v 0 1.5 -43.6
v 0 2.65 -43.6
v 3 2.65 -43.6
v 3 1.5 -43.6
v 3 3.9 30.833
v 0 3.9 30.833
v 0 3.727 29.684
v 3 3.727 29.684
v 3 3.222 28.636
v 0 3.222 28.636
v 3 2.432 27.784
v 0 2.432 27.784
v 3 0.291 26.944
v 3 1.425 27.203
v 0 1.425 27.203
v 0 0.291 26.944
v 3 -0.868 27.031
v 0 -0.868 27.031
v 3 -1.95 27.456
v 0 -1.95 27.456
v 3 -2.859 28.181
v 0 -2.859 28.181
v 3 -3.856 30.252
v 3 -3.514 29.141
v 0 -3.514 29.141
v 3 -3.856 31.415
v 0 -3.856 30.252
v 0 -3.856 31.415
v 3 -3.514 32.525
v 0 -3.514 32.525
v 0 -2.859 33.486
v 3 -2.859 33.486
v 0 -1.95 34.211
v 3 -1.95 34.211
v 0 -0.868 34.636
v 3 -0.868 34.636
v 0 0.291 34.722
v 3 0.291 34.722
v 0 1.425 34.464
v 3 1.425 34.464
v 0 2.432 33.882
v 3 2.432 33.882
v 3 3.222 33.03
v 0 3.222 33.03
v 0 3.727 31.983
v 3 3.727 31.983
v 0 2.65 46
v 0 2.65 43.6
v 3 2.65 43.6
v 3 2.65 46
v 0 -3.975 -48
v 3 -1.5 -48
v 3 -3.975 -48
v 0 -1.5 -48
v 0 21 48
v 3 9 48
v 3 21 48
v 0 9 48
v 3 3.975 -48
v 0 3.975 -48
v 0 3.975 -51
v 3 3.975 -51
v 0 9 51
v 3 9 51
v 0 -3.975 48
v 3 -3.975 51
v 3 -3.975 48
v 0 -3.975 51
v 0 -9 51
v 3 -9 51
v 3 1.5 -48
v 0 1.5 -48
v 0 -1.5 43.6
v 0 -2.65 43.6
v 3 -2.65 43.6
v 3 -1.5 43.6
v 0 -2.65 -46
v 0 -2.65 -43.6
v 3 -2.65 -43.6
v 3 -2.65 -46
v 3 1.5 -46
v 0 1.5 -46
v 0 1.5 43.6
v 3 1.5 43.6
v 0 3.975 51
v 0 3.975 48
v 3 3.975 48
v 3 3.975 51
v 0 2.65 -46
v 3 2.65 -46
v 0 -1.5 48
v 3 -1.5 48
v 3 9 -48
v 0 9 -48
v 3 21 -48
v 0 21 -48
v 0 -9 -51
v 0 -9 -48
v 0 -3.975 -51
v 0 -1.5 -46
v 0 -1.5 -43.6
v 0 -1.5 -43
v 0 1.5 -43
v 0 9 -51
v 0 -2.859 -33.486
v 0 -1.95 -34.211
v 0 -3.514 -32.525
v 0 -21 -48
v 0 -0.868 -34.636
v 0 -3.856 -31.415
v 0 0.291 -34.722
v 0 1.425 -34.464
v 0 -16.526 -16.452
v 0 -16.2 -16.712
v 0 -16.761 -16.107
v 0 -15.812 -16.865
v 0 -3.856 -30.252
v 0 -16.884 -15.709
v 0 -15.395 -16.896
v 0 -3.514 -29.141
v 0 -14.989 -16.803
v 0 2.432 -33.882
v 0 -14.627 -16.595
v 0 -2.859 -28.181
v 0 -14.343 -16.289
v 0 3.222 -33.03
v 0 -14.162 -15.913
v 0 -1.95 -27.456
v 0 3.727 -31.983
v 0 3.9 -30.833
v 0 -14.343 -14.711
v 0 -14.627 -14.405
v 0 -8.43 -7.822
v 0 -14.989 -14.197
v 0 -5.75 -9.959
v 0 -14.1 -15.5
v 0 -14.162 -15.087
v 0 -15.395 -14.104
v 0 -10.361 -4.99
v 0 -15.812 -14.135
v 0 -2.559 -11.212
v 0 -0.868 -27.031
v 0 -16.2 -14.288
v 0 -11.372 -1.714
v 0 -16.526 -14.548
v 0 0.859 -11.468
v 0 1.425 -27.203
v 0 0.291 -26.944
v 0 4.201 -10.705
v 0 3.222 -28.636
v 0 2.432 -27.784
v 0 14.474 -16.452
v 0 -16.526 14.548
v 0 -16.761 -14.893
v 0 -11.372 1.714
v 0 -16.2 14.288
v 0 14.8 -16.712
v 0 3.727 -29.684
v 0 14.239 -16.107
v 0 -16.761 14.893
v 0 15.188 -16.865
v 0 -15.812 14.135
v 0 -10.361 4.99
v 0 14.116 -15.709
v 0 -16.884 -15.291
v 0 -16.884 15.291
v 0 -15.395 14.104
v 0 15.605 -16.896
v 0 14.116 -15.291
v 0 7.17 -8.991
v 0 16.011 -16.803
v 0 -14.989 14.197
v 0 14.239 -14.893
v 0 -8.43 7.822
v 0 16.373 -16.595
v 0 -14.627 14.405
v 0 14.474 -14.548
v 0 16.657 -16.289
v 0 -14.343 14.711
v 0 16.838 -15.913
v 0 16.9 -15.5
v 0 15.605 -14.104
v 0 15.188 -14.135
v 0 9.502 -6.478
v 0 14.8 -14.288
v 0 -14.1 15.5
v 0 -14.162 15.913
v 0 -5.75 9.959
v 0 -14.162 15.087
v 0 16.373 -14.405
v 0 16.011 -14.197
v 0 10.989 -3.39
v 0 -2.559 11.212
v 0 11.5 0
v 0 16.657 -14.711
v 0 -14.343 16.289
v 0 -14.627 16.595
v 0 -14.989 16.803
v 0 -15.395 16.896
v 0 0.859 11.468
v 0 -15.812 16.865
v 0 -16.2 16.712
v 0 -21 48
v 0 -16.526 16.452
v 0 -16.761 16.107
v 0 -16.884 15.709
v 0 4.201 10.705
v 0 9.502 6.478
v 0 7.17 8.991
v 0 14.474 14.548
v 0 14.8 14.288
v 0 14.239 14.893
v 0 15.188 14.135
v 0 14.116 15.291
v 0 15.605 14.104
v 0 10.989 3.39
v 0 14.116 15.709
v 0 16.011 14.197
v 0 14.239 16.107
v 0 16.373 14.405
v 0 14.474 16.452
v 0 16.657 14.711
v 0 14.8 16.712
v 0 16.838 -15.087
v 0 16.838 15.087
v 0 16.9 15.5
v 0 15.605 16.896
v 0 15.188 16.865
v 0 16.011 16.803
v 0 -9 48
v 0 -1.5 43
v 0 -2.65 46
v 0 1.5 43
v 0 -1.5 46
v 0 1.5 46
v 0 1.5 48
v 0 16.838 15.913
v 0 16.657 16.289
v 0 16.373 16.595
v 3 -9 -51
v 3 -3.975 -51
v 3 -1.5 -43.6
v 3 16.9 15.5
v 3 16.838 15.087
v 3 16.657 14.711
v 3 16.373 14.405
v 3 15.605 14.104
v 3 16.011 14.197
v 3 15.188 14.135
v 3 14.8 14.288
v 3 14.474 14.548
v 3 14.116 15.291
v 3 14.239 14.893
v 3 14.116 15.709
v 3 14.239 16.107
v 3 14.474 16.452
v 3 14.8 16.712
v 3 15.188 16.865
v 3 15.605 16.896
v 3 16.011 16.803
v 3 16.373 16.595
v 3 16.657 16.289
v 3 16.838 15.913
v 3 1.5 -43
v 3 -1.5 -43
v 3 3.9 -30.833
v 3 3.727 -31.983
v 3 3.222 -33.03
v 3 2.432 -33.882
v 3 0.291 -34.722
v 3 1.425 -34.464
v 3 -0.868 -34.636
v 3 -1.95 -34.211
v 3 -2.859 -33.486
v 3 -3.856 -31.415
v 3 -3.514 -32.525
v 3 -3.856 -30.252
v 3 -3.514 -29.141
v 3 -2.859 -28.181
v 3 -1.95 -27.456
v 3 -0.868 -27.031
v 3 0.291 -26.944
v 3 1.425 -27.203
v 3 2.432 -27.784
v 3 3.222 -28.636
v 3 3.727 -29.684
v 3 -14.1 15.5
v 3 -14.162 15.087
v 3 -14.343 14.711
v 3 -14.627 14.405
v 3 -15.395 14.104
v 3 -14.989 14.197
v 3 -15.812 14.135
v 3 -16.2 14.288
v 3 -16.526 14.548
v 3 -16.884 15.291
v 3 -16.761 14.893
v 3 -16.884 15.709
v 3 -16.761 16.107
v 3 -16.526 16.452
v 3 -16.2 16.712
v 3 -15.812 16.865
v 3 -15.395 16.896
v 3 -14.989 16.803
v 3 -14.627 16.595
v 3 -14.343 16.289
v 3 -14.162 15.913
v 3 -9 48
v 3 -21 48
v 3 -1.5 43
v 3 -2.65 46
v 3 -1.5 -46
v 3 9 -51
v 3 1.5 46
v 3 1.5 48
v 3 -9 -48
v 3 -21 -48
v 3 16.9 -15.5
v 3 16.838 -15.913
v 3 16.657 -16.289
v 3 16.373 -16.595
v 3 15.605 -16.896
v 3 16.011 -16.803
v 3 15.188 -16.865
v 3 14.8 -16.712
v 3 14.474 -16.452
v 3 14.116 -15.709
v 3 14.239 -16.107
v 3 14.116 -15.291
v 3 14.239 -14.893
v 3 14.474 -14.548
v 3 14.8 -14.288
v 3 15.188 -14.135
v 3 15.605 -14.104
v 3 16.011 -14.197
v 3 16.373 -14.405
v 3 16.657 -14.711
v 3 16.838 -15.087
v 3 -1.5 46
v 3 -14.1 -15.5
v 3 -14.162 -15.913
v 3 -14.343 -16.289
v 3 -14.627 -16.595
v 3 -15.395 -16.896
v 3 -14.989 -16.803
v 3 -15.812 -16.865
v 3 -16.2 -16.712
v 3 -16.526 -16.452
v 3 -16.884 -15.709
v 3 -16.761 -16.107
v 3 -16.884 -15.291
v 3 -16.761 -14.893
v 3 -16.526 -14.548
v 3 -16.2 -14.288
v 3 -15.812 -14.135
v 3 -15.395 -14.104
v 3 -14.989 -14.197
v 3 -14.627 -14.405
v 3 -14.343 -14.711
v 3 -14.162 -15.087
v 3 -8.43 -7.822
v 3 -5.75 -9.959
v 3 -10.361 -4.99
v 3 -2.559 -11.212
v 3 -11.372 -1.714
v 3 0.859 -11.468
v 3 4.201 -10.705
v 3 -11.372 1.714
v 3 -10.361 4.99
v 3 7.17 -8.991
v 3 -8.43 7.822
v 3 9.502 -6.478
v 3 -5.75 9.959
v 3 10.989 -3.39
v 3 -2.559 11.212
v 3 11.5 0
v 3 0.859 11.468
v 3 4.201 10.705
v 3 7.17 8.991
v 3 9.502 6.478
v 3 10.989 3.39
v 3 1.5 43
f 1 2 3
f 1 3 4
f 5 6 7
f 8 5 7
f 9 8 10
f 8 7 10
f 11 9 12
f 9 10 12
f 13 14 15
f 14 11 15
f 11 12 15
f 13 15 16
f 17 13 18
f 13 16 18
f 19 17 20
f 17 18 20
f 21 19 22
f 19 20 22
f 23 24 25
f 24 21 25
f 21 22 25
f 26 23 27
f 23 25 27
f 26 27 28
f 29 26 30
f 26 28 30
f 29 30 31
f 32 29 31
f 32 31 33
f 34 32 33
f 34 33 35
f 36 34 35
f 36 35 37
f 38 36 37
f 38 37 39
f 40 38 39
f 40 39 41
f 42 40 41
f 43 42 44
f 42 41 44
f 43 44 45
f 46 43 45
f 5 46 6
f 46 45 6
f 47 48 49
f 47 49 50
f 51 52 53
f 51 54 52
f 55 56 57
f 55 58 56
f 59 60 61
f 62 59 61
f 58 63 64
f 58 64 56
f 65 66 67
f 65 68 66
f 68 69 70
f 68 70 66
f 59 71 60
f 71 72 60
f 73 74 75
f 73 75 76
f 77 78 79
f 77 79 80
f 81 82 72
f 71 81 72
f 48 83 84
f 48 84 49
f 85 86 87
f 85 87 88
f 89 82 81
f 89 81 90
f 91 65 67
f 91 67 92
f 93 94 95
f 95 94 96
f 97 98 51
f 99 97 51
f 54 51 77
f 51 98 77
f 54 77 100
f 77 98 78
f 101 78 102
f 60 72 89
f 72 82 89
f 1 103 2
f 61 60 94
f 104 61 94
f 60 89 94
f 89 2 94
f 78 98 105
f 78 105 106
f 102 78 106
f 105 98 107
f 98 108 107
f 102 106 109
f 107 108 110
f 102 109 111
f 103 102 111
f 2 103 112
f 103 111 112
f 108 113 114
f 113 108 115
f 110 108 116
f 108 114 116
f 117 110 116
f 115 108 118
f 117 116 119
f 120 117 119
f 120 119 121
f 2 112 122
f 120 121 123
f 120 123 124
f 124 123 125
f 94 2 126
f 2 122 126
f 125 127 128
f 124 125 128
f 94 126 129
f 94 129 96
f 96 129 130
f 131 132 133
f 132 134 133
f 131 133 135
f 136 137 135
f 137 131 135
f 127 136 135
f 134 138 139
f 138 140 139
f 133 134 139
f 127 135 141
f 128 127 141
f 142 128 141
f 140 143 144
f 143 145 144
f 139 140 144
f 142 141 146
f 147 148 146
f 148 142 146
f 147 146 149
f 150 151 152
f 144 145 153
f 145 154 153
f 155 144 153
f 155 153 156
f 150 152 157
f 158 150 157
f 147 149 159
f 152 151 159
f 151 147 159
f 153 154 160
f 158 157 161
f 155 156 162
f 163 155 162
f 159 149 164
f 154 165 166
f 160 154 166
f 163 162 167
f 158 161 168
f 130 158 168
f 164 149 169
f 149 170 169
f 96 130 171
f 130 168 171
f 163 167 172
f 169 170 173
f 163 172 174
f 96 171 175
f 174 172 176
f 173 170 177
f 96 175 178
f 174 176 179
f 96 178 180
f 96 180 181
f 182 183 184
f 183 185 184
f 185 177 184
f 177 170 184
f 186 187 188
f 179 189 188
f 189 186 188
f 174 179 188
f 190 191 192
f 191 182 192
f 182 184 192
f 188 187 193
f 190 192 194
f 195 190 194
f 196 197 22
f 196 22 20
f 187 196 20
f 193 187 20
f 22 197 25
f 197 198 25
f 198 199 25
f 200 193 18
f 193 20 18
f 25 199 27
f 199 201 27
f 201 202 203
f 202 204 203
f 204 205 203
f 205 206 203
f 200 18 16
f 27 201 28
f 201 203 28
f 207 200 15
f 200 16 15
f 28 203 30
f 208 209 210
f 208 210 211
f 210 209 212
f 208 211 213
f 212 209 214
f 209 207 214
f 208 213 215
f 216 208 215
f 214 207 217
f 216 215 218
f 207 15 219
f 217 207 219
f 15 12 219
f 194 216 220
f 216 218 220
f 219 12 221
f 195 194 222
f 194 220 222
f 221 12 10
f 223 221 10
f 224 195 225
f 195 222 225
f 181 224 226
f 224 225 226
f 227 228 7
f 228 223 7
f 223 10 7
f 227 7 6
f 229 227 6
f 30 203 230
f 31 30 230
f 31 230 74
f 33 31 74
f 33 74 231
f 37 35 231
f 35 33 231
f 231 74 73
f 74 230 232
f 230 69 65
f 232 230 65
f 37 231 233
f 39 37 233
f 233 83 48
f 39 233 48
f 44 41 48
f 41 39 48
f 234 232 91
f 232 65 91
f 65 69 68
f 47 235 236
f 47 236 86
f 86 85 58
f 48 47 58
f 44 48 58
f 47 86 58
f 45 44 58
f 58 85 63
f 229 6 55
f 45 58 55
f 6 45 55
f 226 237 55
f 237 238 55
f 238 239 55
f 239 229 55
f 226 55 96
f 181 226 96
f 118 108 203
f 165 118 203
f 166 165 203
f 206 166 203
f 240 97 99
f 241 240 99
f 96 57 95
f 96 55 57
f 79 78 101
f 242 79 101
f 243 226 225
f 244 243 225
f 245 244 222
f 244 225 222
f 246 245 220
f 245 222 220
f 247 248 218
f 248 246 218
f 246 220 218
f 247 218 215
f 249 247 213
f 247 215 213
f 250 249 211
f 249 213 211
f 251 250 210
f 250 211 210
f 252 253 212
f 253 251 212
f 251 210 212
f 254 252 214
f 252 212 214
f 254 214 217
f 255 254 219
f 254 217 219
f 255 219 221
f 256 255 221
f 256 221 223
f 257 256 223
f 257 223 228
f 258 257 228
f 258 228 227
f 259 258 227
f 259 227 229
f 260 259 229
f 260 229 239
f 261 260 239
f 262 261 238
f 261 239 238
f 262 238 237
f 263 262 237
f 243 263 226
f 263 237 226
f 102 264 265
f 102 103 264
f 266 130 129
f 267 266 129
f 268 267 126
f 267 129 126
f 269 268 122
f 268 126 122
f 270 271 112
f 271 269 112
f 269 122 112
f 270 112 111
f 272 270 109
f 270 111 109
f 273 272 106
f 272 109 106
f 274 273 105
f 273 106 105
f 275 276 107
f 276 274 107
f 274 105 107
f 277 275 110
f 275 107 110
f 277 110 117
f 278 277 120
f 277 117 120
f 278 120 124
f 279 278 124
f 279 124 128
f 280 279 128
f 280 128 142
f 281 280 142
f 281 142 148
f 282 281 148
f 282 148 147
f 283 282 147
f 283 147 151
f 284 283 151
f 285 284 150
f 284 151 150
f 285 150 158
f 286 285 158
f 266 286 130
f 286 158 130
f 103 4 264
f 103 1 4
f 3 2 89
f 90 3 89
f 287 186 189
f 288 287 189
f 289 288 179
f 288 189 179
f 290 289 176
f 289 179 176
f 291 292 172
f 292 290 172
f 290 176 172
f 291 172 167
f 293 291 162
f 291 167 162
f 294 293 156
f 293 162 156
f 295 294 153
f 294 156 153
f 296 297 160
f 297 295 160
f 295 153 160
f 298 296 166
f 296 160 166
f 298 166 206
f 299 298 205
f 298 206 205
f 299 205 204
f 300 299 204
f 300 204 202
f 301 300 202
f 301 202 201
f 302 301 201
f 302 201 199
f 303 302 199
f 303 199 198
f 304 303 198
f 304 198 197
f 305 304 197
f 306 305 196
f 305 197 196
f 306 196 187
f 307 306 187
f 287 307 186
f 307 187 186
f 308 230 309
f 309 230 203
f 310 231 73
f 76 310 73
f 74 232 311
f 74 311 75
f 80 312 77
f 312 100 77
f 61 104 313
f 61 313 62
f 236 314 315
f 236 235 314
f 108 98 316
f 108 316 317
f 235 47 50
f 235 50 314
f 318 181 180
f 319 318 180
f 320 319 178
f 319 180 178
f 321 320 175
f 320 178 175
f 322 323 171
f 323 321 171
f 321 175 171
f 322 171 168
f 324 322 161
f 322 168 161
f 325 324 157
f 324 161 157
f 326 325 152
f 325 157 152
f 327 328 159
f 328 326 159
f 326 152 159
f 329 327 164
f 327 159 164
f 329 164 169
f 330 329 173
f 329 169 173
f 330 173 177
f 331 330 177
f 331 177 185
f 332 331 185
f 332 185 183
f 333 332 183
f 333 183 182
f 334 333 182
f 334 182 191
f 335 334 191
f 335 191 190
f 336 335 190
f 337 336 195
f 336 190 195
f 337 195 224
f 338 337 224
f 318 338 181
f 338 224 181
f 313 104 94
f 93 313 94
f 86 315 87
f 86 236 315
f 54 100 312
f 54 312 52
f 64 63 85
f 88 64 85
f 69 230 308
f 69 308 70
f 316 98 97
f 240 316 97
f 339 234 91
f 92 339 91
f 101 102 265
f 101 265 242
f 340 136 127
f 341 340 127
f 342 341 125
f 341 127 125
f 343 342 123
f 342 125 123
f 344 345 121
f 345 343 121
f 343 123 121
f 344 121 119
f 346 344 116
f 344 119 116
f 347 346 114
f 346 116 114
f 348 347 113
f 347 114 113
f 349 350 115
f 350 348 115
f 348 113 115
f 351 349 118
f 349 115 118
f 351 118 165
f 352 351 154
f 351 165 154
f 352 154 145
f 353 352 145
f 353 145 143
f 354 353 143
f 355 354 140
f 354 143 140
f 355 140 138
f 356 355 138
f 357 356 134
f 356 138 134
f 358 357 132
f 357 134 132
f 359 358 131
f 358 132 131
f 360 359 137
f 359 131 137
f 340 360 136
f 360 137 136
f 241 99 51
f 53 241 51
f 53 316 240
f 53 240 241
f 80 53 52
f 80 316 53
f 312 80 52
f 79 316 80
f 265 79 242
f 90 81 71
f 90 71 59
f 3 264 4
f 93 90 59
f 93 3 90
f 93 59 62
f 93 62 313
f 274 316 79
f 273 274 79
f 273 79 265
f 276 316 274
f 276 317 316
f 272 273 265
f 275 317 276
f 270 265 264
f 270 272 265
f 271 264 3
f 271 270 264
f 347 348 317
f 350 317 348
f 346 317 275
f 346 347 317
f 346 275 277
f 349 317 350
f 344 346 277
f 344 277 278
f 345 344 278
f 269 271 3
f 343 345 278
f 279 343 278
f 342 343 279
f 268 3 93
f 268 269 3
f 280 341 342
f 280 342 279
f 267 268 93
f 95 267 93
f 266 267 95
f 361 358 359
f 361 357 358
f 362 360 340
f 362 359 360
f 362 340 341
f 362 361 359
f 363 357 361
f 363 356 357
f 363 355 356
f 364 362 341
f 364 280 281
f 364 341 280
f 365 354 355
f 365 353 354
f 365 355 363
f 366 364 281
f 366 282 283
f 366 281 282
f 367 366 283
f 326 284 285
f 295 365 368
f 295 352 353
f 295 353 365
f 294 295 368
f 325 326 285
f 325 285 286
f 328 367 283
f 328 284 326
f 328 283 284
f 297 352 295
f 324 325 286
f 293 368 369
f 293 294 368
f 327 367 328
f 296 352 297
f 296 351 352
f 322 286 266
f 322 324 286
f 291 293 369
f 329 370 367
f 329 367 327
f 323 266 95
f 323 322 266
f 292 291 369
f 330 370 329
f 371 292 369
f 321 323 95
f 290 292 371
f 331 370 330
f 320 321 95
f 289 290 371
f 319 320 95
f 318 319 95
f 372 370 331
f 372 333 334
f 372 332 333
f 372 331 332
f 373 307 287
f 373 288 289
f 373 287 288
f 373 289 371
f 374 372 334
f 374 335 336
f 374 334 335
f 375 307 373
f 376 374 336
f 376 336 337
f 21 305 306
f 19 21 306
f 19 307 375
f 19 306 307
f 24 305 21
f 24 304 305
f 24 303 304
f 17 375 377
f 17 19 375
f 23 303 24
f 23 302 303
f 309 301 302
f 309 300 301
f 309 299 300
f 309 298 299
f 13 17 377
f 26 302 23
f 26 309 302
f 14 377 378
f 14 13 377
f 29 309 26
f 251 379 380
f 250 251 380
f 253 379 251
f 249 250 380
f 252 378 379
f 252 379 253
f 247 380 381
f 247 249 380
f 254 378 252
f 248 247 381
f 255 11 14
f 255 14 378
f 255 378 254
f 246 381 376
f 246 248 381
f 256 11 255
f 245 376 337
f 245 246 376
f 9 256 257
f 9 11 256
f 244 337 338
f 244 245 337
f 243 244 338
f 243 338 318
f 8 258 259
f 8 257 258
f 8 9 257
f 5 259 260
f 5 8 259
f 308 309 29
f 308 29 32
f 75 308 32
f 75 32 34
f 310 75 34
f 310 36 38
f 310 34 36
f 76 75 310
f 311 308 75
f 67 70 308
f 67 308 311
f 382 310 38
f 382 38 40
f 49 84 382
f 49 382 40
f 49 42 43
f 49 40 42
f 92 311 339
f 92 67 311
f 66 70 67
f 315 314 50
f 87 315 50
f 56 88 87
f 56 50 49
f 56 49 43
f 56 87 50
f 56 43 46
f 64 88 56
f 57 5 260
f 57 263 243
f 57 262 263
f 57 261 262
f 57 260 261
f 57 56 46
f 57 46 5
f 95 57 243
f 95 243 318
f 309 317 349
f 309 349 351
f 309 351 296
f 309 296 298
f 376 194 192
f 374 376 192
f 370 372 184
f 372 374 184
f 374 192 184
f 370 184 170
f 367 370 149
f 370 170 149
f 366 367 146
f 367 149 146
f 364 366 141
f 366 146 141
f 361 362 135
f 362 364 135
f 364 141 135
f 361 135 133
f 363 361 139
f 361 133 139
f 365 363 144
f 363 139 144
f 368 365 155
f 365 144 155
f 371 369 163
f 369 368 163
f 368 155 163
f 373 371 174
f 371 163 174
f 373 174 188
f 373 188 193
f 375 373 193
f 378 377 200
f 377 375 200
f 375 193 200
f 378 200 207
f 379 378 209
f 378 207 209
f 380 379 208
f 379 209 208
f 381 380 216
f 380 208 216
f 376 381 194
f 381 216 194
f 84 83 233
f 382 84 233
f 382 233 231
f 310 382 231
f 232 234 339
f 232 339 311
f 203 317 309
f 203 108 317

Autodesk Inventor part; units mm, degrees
ref_plane "YZ Plane" through (0, 0, 0) normal (1, 0, 0) x (0, 1, 0)
ref_plane "XZ Plane" through (0, 0, 0) normal (0, 1, 0) x (-1, 0, 0)
ref_plane "XY Plane" through (0, 0, 0) normal (0, 0, 1) x (1, 0, 0)
sketch "Sketch2" plane through (0, 0, 0) normal (1, 0, 0) x (0, 1, 0)
  line L0 (-29.4, 0) -> (29.4, 0) construction
  line L1 (0, -71.4) -> (0, 71.4) construction
  line L2 (1.5, -46) -> (1.5, -48)
  line L3 (-1.5, -46) -> (-1.5, -48)
  line L4 (1.5, -46) -> (2.65, -46)
  line L5 (2.65, -43.6) -> (2.65, -46)
  line L6 (2.65, -43.6) -> (1.5, -43.6)
  line L7 (1.5, -43.6) -> (1.5, -43)
  line L8 (1.5, -43) -> (-1.5, -43)
  line L9 (-1.5, -43) -> (-1.5, -43.6)
  line L10 (-2.65, -43.6) -> (-1.5, -43.6)
  line L11 (-2.65, -43.6) -> (-2.65, -46)
  line L12 (-1.5, -46) -> (-2.65, -46)
  line L13 (1.5, -48) -> (9, -48)
  line L14 (9, -51) -> (9, -48)
  line L15 (-1.5, -48) -> (-9, -48)
  line L16 (3.975, -48) -> (3.975, -51)
  line L17 (9, -51) -> (3.975, -51)
  line L18 (-9, -48) -> (-9, -51)
  line L19 (-9, -51) -> (-3.975, -51)
  line L20 (-3.975, -51) -> (-3.975, -48)
  line L21 (9, -48) -> (10.5, -48)
  line L22 (-9, -48) -> (-10.5, -48)
  line L23 (2.65, 43.6) -> (2.65, 46)
  line L24 (2.65, 46) -> (-2.65, 46)
  line L25 (-2.65, 46) -> (-2.65, 43.6)
  line L26 (-2.65, 43.6) -> (2.65, 43.6)
  line L27 (-10.5, 48) -> (-9, 48)
  line L28 (1.5, 46) -> (1.5, 48)
  line L29 (-1.5, 46) -> (-1.5, 48)
  line L30 (1.5, 43.6) -> (1.5, 43)
  line L31 (1.5, 43) -> (-1.5, 43)
  line L32 (-1.5, 43) -> (-1.5, 43.6)
  line L33 (9, 51) -> (9, 48)
  line L34 (3.975, 48) -> (3.975, 51)
  line L35 (9, 51) -> (3.975, 51)
  line L36 (-9, 48) -> (-9, 51)
  line L37 (-9, 51) -> (-3.975, 51)
  line L38 (-3.975, 51) -> (-3.975, 48)
  line L39 (9, 48) -> (21, 48)
  line L40 (-9, 48) -> (-10.5, 48)
  line L41 (21, 48) -> (21, -48)
  line L42 (-21, -48) -> (-21, 48)
  line L43 (3.975, 48) -> (9, 48)
  line L44 (-3.975, 48) -> (3.975, 48)
  line L45 (-9, 48) -> (-3.975, 48)
  line L46 (10.5, -48) -> (21, -48)
  line L47 (-10.5, -48) -> (-21, -48)
  line L48 (-10.5, 48) -> (-21, 48)
  line L49 (9, 48) -> (10.5, 48)
  circle A0 centre (0, 0) radius 11.5 projected
  circle A1 centre (0, 30.8333) radius 3.9 projected
  circle A2 centre (0, -30.8333) radius 3.9 projected
  line L50 (2.65, 46) -> (2.65, 43.6) projected
  line L51 (2.65, 43.6) -> (-2.65, 43.6) projected
  line L52 (-2.65, 43.6) -> (-2.65, 46) projected
  line L53 (-2.65, 46) -> (2.65, 46) projected
  line L54 (2.65, -43.6) -> (2.65, -46) projected
  line L55 (2.65, -46) -> (-2.65, -46) projected
  line L56 (-2.65, -46) -> (-2.65, -43.6) projected
  line L57 (-2.65, -43.6) -> (2.65, -43.6) projected
  circle A3 centre (15.5, -15.5) radius 1.4 projected
  circle A4 centre (-15.5, -15.5) radius 1.4 projected
  circle A5 centre (-15.5, 15.5) radius 1.4 projected
  circle A6 centre (15.5, 15.5) radius 1.4 projected
  line L58 (-21, -51) -> (-10.5, -51) projected
  line L59 (-10.5, -51) -> (-10.5, -48) projected
  line L60 (-10.5, -48) -> (10.5, -48) projected
  line L61 (10.5, -48) -> (10.5, -51) projected
  line L62 (10.5, -51) -> (21, -51) projected
  line L63 (21, -51) -> (21, 51) projected
  line L64 (21, 51) -> (10.5, 51) projected
  line L65 (10.5, 51) -> (10.5, 48) projected
  line L66 (10.5, 48) -> (-10.5, 48) projected
  line L67 (-10.5, 48) -> (-10.5, 51) projected
  line L68 (-10.5, 51) -> (-21, 51) projected
  line L69 (-21, 51) -> (-21, -51) projected
  dimension "d4" = 3
  dimension "d6" = 7.95
  dimension "d8" = 5
extrude "Extrusion1" add sketch "Sketch2" along normal blind 3 contours L4 L5 L6 L7 L8 L9 L10 L11 L12 L3 L15 L22 L47 L42 L48 L27 L45 L44 L29 L24 L25 L26 L32 L31 L30 L23 L28 L43 L39 L41 L46 L21 L13 L2 | L13 L14 L17 L16 | L20 L19 L18 L15 | L43 L34 L35 L33 | L36 L37 L38 L45
properties part number "Front-Outer"
